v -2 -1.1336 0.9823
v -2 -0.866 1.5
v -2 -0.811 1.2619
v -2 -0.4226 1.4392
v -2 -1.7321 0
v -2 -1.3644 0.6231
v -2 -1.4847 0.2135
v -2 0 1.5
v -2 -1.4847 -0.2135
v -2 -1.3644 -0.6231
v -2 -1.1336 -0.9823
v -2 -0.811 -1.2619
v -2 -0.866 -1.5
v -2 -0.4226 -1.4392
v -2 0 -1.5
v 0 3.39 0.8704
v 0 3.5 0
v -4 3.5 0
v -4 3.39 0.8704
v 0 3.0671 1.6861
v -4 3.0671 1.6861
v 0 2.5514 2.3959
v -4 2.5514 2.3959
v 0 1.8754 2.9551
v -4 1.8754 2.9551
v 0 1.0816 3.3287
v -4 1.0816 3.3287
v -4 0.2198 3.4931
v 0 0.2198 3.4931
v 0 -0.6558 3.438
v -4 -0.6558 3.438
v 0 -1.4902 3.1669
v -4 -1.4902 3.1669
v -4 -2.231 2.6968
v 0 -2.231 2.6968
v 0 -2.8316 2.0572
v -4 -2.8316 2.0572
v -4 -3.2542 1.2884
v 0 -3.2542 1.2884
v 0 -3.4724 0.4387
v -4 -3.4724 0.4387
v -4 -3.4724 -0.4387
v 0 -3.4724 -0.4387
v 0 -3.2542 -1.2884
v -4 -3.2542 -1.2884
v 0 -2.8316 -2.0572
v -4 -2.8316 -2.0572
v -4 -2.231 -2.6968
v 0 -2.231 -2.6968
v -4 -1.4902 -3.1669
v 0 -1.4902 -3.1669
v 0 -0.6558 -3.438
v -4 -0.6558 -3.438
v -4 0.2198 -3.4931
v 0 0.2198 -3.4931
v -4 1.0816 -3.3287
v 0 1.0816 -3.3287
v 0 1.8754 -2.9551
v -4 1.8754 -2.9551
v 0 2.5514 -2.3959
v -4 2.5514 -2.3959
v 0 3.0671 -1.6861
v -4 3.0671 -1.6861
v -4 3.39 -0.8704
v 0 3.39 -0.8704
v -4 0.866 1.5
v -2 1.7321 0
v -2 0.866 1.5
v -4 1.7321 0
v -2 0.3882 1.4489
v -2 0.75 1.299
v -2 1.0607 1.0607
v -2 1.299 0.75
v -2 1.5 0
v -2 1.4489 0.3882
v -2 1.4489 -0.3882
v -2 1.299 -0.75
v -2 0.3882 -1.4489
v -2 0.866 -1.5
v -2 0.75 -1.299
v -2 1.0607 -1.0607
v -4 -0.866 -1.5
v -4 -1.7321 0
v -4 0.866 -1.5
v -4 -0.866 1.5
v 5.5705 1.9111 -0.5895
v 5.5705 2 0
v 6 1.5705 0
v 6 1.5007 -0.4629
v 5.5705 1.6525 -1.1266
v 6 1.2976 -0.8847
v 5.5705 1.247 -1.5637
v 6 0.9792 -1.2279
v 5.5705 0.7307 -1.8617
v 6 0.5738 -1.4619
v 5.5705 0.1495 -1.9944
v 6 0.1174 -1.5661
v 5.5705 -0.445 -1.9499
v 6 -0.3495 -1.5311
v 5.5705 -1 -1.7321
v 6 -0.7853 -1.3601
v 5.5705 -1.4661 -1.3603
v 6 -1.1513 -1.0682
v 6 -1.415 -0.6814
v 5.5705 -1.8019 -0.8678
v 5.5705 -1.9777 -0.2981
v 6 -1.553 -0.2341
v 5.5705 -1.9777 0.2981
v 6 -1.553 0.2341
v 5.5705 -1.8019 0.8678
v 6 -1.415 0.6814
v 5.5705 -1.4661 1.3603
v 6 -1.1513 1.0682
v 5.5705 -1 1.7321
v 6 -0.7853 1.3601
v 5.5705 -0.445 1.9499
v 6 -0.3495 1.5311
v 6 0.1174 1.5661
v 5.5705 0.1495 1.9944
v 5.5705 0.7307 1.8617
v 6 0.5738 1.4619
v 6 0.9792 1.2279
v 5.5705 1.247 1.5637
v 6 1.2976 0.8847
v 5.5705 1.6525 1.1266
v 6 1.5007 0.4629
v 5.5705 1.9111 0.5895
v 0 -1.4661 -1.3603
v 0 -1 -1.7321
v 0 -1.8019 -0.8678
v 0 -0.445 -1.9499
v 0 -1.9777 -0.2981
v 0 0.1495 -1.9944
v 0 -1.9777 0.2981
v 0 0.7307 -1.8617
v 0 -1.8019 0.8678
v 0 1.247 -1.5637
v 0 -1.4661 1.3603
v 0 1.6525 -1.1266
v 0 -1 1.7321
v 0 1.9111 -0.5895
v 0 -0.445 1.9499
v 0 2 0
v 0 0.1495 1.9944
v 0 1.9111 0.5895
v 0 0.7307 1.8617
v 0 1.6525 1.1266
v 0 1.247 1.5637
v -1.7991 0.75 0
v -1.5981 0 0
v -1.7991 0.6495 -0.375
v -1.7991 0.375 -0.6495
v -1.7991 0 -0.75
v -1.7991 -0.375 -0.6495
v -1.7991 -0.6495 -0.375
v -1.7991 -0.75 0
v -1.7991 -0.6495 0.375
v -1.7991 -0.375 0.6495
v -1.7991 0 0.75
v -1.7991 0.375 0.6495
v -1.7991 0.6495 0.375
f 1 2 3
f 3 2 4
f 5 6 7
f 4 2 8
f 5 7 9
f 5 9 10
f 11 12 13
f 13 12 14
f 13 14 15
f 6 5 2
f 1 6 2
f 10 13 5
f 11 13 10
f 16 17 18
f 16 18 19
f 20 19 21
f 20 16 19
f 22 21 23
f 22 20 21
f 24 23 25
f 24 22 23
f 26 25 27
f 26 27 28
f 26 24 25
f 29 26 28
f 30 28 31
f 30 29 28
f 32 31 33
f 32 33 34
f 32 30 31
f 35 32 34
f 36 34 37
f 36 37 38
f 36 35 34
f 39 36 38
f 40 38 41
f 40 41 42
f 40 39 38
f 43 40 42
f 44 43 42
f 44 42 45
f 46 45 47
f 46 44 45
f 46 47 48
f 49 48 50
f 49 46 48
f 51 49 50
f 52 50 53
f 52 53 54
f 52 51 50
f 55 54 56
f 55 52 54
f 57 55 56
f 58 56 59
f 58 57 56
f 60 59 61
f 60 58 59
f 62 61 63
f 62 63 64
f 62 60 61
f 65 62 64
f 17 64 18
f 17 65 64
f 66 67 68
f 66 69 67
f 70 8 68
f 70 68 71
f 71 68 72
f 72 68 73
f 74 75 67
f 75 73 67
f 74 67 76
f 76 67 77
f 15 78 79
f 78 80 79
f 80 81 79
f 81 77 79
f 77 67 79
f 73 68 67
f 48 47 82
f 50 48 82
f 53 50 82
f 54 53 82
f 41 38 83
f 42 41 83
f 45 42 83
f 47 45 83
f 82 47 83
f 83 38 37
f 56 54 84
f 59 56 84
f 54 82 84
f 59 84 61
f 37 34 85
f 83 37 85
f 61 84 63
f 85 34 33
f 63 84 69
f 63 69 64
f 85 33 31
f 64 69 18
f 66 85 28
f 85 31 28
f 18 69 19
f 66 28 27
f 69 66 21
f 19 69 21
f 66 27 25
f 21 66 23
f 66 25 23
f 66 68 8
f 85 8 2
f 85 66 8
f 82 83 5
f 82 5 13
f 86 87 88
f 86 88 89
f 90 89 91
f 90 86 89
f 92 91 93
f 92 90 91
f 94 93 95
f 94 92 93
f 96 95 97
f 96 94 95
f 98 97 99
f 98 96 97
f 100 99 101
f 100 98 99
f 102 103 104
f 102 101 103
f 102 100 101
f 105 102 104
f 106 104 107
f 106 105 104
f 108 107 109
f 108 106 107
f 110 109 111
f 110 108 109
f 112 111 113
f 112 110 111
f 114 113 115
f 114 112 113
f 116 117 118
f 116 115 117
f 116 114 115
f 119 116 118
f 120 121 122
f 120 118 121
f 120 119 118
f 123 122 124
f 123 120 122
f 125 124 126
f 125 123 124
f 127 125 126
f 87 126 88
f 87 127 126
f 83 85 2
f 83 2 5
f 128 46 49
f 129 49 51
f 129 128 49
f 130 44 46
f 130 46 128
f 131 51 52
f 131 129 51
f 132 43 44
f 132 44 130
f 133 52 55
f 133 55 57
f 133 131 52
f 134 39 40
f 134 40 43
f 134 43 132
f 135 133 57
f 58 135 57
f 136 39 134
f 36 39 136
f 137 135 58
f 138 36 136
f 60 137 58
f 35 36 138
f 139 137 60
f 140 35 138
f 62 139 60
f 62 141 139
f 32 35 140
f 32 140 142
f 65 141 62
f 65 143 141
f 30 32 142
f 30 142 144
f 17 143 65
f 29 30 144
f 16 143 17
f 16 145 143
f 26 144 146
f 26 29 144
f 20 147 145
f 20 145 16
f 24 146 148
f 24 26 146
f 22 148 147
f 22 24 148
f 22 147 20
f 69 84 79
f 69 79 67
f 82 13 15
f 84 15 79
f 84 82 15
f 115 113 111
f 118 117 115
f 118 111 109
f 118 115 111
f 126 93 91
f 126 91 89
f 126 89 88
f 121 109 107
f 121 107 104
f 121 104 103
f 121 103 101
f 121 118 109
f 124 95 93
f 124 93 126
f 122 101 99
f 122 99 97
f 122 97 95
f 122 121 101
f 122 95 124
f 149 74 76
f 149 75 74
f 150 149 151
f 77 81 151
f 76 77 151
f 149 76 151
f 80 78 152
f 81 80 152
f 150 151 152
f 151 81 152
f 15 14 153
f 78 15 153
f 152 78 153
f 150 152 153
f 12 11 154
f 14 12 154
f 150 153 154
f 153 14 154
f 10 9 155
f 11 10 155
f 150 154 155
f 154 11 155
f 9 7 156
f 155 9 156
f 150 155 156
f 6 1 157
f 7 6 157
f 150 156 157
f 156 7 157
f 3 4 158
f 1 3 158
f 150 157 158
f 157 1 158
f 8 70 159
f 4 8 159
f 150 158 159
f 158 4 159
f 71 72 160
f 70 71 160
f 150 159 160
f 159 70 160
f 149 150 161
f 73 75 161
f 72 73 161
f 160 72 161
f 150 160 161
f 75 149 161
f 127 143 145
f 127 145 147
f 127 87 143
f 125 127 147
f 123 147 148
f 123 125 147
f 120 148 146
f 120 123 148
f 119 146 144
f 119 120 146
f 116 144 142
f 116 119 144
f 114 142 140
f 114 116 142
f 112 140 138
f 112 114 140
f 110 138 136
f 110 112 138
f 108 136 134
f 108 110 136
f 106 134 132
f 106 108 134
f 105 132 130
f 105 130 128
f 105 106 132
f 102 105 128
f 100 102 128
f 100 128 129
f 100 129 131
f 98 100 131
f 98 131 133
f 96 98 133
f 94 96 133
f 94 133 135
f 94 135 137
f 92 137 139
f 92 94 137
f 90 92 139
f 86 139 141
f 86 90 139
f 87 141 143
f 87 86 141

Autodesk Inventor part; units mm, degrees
sketch "Sketch_1" plane through (0, 0, 0) normal (0, 0, 1) x (1, 0, 0)
  line L0 (6, 0) -> (-4, 0)
  line L1 (-4, 0) -> (-4, 3.5)
  line L2 (-4, 3.5) -> (0, 3.5)
  line L3 (0, 3.5) -> (0, 2)
  line L4 (0, 2) -> (5.5705, 2)
  line L5 (5.5705, 2) -> (6, 1.5705)
  line L6 (6, 1.5705) -> (6, 0)
  line L7 (6, 0) -> (-4, 0)
revolve "Revolution1" add sketch "Sketch_1" angle 360 about axis through (6, 0, 0) along (1, 0, 0)
thread "Thread1" size "M4x0.7" class "6g" standard "ISO Metric profile" length 5.5 offset 0.5
sketch "Sketch_4" plane through (0, 0, 0) normal (0, 0, 1) x (1, 0, 0)
  line L0 (-1.5981, 0) -> (-4, 0)
  line L1 (-4, 0) -> (-4, 1.5)
  line L2 (-4, 1.5) -> (-2, 1.5)
  line L3 (-2, 1.5) -> (-1.5981, 0)
  line L4 (-1.5981, 0) -> (-4, 0)
revolve "Revolution2" cut sketch "Sketch_4" angle 360 about axis through (-1.5981, 0, 0) along (1, 0, 0)
sketch "Sketch_3" plane through (-4, 0, 0) normal (1, 0, 0) x (0, 0, -1)
  line L0 (-1.5, 0.866) -> (-1.5, -0.866)
  line L1 (-1.5, -0.866) -> (0, -1.7321)
  line L2 (0, -1.7321) -> (1.5, -0.866)
  line L3 (1.5, -0.866) -> (1.5, 0.866)
  line L4 (1.5, 0.866) -> (0, 1.7321)
  line L5 (0, 1.7321) -> (-1.5, 0.866)
extrude "Extrusion1" cut sketch "Sketch_3" along normal blind 2
ref_plane "bolt_XY" through (0, 0, 0) normal (1, 0, 0) x (0, 0, -1)
ref_plane "bolt_YZ" through (0, 0, 0) normal (0, 0, -1) x (0, 1, 0)
ref_plane "bolt_ZX" through (0, 0, 0) normal (0, 1, 0) x (1, 0, 0)
ref_plane "nut_XY" through (6, 0, 0) normal (1, 0, 0) x (0, 0, -1)
ref_plane "nut_YZ" through (6, 0, 0) normal (0, 0, -1) x (0, 1, 0)
ref_plane "nut_ZX" through (6, 0, 0) normal (0, 1, 0) x (1, 0, 0)
properties part number "CBM4-6" material "MISUMI"
